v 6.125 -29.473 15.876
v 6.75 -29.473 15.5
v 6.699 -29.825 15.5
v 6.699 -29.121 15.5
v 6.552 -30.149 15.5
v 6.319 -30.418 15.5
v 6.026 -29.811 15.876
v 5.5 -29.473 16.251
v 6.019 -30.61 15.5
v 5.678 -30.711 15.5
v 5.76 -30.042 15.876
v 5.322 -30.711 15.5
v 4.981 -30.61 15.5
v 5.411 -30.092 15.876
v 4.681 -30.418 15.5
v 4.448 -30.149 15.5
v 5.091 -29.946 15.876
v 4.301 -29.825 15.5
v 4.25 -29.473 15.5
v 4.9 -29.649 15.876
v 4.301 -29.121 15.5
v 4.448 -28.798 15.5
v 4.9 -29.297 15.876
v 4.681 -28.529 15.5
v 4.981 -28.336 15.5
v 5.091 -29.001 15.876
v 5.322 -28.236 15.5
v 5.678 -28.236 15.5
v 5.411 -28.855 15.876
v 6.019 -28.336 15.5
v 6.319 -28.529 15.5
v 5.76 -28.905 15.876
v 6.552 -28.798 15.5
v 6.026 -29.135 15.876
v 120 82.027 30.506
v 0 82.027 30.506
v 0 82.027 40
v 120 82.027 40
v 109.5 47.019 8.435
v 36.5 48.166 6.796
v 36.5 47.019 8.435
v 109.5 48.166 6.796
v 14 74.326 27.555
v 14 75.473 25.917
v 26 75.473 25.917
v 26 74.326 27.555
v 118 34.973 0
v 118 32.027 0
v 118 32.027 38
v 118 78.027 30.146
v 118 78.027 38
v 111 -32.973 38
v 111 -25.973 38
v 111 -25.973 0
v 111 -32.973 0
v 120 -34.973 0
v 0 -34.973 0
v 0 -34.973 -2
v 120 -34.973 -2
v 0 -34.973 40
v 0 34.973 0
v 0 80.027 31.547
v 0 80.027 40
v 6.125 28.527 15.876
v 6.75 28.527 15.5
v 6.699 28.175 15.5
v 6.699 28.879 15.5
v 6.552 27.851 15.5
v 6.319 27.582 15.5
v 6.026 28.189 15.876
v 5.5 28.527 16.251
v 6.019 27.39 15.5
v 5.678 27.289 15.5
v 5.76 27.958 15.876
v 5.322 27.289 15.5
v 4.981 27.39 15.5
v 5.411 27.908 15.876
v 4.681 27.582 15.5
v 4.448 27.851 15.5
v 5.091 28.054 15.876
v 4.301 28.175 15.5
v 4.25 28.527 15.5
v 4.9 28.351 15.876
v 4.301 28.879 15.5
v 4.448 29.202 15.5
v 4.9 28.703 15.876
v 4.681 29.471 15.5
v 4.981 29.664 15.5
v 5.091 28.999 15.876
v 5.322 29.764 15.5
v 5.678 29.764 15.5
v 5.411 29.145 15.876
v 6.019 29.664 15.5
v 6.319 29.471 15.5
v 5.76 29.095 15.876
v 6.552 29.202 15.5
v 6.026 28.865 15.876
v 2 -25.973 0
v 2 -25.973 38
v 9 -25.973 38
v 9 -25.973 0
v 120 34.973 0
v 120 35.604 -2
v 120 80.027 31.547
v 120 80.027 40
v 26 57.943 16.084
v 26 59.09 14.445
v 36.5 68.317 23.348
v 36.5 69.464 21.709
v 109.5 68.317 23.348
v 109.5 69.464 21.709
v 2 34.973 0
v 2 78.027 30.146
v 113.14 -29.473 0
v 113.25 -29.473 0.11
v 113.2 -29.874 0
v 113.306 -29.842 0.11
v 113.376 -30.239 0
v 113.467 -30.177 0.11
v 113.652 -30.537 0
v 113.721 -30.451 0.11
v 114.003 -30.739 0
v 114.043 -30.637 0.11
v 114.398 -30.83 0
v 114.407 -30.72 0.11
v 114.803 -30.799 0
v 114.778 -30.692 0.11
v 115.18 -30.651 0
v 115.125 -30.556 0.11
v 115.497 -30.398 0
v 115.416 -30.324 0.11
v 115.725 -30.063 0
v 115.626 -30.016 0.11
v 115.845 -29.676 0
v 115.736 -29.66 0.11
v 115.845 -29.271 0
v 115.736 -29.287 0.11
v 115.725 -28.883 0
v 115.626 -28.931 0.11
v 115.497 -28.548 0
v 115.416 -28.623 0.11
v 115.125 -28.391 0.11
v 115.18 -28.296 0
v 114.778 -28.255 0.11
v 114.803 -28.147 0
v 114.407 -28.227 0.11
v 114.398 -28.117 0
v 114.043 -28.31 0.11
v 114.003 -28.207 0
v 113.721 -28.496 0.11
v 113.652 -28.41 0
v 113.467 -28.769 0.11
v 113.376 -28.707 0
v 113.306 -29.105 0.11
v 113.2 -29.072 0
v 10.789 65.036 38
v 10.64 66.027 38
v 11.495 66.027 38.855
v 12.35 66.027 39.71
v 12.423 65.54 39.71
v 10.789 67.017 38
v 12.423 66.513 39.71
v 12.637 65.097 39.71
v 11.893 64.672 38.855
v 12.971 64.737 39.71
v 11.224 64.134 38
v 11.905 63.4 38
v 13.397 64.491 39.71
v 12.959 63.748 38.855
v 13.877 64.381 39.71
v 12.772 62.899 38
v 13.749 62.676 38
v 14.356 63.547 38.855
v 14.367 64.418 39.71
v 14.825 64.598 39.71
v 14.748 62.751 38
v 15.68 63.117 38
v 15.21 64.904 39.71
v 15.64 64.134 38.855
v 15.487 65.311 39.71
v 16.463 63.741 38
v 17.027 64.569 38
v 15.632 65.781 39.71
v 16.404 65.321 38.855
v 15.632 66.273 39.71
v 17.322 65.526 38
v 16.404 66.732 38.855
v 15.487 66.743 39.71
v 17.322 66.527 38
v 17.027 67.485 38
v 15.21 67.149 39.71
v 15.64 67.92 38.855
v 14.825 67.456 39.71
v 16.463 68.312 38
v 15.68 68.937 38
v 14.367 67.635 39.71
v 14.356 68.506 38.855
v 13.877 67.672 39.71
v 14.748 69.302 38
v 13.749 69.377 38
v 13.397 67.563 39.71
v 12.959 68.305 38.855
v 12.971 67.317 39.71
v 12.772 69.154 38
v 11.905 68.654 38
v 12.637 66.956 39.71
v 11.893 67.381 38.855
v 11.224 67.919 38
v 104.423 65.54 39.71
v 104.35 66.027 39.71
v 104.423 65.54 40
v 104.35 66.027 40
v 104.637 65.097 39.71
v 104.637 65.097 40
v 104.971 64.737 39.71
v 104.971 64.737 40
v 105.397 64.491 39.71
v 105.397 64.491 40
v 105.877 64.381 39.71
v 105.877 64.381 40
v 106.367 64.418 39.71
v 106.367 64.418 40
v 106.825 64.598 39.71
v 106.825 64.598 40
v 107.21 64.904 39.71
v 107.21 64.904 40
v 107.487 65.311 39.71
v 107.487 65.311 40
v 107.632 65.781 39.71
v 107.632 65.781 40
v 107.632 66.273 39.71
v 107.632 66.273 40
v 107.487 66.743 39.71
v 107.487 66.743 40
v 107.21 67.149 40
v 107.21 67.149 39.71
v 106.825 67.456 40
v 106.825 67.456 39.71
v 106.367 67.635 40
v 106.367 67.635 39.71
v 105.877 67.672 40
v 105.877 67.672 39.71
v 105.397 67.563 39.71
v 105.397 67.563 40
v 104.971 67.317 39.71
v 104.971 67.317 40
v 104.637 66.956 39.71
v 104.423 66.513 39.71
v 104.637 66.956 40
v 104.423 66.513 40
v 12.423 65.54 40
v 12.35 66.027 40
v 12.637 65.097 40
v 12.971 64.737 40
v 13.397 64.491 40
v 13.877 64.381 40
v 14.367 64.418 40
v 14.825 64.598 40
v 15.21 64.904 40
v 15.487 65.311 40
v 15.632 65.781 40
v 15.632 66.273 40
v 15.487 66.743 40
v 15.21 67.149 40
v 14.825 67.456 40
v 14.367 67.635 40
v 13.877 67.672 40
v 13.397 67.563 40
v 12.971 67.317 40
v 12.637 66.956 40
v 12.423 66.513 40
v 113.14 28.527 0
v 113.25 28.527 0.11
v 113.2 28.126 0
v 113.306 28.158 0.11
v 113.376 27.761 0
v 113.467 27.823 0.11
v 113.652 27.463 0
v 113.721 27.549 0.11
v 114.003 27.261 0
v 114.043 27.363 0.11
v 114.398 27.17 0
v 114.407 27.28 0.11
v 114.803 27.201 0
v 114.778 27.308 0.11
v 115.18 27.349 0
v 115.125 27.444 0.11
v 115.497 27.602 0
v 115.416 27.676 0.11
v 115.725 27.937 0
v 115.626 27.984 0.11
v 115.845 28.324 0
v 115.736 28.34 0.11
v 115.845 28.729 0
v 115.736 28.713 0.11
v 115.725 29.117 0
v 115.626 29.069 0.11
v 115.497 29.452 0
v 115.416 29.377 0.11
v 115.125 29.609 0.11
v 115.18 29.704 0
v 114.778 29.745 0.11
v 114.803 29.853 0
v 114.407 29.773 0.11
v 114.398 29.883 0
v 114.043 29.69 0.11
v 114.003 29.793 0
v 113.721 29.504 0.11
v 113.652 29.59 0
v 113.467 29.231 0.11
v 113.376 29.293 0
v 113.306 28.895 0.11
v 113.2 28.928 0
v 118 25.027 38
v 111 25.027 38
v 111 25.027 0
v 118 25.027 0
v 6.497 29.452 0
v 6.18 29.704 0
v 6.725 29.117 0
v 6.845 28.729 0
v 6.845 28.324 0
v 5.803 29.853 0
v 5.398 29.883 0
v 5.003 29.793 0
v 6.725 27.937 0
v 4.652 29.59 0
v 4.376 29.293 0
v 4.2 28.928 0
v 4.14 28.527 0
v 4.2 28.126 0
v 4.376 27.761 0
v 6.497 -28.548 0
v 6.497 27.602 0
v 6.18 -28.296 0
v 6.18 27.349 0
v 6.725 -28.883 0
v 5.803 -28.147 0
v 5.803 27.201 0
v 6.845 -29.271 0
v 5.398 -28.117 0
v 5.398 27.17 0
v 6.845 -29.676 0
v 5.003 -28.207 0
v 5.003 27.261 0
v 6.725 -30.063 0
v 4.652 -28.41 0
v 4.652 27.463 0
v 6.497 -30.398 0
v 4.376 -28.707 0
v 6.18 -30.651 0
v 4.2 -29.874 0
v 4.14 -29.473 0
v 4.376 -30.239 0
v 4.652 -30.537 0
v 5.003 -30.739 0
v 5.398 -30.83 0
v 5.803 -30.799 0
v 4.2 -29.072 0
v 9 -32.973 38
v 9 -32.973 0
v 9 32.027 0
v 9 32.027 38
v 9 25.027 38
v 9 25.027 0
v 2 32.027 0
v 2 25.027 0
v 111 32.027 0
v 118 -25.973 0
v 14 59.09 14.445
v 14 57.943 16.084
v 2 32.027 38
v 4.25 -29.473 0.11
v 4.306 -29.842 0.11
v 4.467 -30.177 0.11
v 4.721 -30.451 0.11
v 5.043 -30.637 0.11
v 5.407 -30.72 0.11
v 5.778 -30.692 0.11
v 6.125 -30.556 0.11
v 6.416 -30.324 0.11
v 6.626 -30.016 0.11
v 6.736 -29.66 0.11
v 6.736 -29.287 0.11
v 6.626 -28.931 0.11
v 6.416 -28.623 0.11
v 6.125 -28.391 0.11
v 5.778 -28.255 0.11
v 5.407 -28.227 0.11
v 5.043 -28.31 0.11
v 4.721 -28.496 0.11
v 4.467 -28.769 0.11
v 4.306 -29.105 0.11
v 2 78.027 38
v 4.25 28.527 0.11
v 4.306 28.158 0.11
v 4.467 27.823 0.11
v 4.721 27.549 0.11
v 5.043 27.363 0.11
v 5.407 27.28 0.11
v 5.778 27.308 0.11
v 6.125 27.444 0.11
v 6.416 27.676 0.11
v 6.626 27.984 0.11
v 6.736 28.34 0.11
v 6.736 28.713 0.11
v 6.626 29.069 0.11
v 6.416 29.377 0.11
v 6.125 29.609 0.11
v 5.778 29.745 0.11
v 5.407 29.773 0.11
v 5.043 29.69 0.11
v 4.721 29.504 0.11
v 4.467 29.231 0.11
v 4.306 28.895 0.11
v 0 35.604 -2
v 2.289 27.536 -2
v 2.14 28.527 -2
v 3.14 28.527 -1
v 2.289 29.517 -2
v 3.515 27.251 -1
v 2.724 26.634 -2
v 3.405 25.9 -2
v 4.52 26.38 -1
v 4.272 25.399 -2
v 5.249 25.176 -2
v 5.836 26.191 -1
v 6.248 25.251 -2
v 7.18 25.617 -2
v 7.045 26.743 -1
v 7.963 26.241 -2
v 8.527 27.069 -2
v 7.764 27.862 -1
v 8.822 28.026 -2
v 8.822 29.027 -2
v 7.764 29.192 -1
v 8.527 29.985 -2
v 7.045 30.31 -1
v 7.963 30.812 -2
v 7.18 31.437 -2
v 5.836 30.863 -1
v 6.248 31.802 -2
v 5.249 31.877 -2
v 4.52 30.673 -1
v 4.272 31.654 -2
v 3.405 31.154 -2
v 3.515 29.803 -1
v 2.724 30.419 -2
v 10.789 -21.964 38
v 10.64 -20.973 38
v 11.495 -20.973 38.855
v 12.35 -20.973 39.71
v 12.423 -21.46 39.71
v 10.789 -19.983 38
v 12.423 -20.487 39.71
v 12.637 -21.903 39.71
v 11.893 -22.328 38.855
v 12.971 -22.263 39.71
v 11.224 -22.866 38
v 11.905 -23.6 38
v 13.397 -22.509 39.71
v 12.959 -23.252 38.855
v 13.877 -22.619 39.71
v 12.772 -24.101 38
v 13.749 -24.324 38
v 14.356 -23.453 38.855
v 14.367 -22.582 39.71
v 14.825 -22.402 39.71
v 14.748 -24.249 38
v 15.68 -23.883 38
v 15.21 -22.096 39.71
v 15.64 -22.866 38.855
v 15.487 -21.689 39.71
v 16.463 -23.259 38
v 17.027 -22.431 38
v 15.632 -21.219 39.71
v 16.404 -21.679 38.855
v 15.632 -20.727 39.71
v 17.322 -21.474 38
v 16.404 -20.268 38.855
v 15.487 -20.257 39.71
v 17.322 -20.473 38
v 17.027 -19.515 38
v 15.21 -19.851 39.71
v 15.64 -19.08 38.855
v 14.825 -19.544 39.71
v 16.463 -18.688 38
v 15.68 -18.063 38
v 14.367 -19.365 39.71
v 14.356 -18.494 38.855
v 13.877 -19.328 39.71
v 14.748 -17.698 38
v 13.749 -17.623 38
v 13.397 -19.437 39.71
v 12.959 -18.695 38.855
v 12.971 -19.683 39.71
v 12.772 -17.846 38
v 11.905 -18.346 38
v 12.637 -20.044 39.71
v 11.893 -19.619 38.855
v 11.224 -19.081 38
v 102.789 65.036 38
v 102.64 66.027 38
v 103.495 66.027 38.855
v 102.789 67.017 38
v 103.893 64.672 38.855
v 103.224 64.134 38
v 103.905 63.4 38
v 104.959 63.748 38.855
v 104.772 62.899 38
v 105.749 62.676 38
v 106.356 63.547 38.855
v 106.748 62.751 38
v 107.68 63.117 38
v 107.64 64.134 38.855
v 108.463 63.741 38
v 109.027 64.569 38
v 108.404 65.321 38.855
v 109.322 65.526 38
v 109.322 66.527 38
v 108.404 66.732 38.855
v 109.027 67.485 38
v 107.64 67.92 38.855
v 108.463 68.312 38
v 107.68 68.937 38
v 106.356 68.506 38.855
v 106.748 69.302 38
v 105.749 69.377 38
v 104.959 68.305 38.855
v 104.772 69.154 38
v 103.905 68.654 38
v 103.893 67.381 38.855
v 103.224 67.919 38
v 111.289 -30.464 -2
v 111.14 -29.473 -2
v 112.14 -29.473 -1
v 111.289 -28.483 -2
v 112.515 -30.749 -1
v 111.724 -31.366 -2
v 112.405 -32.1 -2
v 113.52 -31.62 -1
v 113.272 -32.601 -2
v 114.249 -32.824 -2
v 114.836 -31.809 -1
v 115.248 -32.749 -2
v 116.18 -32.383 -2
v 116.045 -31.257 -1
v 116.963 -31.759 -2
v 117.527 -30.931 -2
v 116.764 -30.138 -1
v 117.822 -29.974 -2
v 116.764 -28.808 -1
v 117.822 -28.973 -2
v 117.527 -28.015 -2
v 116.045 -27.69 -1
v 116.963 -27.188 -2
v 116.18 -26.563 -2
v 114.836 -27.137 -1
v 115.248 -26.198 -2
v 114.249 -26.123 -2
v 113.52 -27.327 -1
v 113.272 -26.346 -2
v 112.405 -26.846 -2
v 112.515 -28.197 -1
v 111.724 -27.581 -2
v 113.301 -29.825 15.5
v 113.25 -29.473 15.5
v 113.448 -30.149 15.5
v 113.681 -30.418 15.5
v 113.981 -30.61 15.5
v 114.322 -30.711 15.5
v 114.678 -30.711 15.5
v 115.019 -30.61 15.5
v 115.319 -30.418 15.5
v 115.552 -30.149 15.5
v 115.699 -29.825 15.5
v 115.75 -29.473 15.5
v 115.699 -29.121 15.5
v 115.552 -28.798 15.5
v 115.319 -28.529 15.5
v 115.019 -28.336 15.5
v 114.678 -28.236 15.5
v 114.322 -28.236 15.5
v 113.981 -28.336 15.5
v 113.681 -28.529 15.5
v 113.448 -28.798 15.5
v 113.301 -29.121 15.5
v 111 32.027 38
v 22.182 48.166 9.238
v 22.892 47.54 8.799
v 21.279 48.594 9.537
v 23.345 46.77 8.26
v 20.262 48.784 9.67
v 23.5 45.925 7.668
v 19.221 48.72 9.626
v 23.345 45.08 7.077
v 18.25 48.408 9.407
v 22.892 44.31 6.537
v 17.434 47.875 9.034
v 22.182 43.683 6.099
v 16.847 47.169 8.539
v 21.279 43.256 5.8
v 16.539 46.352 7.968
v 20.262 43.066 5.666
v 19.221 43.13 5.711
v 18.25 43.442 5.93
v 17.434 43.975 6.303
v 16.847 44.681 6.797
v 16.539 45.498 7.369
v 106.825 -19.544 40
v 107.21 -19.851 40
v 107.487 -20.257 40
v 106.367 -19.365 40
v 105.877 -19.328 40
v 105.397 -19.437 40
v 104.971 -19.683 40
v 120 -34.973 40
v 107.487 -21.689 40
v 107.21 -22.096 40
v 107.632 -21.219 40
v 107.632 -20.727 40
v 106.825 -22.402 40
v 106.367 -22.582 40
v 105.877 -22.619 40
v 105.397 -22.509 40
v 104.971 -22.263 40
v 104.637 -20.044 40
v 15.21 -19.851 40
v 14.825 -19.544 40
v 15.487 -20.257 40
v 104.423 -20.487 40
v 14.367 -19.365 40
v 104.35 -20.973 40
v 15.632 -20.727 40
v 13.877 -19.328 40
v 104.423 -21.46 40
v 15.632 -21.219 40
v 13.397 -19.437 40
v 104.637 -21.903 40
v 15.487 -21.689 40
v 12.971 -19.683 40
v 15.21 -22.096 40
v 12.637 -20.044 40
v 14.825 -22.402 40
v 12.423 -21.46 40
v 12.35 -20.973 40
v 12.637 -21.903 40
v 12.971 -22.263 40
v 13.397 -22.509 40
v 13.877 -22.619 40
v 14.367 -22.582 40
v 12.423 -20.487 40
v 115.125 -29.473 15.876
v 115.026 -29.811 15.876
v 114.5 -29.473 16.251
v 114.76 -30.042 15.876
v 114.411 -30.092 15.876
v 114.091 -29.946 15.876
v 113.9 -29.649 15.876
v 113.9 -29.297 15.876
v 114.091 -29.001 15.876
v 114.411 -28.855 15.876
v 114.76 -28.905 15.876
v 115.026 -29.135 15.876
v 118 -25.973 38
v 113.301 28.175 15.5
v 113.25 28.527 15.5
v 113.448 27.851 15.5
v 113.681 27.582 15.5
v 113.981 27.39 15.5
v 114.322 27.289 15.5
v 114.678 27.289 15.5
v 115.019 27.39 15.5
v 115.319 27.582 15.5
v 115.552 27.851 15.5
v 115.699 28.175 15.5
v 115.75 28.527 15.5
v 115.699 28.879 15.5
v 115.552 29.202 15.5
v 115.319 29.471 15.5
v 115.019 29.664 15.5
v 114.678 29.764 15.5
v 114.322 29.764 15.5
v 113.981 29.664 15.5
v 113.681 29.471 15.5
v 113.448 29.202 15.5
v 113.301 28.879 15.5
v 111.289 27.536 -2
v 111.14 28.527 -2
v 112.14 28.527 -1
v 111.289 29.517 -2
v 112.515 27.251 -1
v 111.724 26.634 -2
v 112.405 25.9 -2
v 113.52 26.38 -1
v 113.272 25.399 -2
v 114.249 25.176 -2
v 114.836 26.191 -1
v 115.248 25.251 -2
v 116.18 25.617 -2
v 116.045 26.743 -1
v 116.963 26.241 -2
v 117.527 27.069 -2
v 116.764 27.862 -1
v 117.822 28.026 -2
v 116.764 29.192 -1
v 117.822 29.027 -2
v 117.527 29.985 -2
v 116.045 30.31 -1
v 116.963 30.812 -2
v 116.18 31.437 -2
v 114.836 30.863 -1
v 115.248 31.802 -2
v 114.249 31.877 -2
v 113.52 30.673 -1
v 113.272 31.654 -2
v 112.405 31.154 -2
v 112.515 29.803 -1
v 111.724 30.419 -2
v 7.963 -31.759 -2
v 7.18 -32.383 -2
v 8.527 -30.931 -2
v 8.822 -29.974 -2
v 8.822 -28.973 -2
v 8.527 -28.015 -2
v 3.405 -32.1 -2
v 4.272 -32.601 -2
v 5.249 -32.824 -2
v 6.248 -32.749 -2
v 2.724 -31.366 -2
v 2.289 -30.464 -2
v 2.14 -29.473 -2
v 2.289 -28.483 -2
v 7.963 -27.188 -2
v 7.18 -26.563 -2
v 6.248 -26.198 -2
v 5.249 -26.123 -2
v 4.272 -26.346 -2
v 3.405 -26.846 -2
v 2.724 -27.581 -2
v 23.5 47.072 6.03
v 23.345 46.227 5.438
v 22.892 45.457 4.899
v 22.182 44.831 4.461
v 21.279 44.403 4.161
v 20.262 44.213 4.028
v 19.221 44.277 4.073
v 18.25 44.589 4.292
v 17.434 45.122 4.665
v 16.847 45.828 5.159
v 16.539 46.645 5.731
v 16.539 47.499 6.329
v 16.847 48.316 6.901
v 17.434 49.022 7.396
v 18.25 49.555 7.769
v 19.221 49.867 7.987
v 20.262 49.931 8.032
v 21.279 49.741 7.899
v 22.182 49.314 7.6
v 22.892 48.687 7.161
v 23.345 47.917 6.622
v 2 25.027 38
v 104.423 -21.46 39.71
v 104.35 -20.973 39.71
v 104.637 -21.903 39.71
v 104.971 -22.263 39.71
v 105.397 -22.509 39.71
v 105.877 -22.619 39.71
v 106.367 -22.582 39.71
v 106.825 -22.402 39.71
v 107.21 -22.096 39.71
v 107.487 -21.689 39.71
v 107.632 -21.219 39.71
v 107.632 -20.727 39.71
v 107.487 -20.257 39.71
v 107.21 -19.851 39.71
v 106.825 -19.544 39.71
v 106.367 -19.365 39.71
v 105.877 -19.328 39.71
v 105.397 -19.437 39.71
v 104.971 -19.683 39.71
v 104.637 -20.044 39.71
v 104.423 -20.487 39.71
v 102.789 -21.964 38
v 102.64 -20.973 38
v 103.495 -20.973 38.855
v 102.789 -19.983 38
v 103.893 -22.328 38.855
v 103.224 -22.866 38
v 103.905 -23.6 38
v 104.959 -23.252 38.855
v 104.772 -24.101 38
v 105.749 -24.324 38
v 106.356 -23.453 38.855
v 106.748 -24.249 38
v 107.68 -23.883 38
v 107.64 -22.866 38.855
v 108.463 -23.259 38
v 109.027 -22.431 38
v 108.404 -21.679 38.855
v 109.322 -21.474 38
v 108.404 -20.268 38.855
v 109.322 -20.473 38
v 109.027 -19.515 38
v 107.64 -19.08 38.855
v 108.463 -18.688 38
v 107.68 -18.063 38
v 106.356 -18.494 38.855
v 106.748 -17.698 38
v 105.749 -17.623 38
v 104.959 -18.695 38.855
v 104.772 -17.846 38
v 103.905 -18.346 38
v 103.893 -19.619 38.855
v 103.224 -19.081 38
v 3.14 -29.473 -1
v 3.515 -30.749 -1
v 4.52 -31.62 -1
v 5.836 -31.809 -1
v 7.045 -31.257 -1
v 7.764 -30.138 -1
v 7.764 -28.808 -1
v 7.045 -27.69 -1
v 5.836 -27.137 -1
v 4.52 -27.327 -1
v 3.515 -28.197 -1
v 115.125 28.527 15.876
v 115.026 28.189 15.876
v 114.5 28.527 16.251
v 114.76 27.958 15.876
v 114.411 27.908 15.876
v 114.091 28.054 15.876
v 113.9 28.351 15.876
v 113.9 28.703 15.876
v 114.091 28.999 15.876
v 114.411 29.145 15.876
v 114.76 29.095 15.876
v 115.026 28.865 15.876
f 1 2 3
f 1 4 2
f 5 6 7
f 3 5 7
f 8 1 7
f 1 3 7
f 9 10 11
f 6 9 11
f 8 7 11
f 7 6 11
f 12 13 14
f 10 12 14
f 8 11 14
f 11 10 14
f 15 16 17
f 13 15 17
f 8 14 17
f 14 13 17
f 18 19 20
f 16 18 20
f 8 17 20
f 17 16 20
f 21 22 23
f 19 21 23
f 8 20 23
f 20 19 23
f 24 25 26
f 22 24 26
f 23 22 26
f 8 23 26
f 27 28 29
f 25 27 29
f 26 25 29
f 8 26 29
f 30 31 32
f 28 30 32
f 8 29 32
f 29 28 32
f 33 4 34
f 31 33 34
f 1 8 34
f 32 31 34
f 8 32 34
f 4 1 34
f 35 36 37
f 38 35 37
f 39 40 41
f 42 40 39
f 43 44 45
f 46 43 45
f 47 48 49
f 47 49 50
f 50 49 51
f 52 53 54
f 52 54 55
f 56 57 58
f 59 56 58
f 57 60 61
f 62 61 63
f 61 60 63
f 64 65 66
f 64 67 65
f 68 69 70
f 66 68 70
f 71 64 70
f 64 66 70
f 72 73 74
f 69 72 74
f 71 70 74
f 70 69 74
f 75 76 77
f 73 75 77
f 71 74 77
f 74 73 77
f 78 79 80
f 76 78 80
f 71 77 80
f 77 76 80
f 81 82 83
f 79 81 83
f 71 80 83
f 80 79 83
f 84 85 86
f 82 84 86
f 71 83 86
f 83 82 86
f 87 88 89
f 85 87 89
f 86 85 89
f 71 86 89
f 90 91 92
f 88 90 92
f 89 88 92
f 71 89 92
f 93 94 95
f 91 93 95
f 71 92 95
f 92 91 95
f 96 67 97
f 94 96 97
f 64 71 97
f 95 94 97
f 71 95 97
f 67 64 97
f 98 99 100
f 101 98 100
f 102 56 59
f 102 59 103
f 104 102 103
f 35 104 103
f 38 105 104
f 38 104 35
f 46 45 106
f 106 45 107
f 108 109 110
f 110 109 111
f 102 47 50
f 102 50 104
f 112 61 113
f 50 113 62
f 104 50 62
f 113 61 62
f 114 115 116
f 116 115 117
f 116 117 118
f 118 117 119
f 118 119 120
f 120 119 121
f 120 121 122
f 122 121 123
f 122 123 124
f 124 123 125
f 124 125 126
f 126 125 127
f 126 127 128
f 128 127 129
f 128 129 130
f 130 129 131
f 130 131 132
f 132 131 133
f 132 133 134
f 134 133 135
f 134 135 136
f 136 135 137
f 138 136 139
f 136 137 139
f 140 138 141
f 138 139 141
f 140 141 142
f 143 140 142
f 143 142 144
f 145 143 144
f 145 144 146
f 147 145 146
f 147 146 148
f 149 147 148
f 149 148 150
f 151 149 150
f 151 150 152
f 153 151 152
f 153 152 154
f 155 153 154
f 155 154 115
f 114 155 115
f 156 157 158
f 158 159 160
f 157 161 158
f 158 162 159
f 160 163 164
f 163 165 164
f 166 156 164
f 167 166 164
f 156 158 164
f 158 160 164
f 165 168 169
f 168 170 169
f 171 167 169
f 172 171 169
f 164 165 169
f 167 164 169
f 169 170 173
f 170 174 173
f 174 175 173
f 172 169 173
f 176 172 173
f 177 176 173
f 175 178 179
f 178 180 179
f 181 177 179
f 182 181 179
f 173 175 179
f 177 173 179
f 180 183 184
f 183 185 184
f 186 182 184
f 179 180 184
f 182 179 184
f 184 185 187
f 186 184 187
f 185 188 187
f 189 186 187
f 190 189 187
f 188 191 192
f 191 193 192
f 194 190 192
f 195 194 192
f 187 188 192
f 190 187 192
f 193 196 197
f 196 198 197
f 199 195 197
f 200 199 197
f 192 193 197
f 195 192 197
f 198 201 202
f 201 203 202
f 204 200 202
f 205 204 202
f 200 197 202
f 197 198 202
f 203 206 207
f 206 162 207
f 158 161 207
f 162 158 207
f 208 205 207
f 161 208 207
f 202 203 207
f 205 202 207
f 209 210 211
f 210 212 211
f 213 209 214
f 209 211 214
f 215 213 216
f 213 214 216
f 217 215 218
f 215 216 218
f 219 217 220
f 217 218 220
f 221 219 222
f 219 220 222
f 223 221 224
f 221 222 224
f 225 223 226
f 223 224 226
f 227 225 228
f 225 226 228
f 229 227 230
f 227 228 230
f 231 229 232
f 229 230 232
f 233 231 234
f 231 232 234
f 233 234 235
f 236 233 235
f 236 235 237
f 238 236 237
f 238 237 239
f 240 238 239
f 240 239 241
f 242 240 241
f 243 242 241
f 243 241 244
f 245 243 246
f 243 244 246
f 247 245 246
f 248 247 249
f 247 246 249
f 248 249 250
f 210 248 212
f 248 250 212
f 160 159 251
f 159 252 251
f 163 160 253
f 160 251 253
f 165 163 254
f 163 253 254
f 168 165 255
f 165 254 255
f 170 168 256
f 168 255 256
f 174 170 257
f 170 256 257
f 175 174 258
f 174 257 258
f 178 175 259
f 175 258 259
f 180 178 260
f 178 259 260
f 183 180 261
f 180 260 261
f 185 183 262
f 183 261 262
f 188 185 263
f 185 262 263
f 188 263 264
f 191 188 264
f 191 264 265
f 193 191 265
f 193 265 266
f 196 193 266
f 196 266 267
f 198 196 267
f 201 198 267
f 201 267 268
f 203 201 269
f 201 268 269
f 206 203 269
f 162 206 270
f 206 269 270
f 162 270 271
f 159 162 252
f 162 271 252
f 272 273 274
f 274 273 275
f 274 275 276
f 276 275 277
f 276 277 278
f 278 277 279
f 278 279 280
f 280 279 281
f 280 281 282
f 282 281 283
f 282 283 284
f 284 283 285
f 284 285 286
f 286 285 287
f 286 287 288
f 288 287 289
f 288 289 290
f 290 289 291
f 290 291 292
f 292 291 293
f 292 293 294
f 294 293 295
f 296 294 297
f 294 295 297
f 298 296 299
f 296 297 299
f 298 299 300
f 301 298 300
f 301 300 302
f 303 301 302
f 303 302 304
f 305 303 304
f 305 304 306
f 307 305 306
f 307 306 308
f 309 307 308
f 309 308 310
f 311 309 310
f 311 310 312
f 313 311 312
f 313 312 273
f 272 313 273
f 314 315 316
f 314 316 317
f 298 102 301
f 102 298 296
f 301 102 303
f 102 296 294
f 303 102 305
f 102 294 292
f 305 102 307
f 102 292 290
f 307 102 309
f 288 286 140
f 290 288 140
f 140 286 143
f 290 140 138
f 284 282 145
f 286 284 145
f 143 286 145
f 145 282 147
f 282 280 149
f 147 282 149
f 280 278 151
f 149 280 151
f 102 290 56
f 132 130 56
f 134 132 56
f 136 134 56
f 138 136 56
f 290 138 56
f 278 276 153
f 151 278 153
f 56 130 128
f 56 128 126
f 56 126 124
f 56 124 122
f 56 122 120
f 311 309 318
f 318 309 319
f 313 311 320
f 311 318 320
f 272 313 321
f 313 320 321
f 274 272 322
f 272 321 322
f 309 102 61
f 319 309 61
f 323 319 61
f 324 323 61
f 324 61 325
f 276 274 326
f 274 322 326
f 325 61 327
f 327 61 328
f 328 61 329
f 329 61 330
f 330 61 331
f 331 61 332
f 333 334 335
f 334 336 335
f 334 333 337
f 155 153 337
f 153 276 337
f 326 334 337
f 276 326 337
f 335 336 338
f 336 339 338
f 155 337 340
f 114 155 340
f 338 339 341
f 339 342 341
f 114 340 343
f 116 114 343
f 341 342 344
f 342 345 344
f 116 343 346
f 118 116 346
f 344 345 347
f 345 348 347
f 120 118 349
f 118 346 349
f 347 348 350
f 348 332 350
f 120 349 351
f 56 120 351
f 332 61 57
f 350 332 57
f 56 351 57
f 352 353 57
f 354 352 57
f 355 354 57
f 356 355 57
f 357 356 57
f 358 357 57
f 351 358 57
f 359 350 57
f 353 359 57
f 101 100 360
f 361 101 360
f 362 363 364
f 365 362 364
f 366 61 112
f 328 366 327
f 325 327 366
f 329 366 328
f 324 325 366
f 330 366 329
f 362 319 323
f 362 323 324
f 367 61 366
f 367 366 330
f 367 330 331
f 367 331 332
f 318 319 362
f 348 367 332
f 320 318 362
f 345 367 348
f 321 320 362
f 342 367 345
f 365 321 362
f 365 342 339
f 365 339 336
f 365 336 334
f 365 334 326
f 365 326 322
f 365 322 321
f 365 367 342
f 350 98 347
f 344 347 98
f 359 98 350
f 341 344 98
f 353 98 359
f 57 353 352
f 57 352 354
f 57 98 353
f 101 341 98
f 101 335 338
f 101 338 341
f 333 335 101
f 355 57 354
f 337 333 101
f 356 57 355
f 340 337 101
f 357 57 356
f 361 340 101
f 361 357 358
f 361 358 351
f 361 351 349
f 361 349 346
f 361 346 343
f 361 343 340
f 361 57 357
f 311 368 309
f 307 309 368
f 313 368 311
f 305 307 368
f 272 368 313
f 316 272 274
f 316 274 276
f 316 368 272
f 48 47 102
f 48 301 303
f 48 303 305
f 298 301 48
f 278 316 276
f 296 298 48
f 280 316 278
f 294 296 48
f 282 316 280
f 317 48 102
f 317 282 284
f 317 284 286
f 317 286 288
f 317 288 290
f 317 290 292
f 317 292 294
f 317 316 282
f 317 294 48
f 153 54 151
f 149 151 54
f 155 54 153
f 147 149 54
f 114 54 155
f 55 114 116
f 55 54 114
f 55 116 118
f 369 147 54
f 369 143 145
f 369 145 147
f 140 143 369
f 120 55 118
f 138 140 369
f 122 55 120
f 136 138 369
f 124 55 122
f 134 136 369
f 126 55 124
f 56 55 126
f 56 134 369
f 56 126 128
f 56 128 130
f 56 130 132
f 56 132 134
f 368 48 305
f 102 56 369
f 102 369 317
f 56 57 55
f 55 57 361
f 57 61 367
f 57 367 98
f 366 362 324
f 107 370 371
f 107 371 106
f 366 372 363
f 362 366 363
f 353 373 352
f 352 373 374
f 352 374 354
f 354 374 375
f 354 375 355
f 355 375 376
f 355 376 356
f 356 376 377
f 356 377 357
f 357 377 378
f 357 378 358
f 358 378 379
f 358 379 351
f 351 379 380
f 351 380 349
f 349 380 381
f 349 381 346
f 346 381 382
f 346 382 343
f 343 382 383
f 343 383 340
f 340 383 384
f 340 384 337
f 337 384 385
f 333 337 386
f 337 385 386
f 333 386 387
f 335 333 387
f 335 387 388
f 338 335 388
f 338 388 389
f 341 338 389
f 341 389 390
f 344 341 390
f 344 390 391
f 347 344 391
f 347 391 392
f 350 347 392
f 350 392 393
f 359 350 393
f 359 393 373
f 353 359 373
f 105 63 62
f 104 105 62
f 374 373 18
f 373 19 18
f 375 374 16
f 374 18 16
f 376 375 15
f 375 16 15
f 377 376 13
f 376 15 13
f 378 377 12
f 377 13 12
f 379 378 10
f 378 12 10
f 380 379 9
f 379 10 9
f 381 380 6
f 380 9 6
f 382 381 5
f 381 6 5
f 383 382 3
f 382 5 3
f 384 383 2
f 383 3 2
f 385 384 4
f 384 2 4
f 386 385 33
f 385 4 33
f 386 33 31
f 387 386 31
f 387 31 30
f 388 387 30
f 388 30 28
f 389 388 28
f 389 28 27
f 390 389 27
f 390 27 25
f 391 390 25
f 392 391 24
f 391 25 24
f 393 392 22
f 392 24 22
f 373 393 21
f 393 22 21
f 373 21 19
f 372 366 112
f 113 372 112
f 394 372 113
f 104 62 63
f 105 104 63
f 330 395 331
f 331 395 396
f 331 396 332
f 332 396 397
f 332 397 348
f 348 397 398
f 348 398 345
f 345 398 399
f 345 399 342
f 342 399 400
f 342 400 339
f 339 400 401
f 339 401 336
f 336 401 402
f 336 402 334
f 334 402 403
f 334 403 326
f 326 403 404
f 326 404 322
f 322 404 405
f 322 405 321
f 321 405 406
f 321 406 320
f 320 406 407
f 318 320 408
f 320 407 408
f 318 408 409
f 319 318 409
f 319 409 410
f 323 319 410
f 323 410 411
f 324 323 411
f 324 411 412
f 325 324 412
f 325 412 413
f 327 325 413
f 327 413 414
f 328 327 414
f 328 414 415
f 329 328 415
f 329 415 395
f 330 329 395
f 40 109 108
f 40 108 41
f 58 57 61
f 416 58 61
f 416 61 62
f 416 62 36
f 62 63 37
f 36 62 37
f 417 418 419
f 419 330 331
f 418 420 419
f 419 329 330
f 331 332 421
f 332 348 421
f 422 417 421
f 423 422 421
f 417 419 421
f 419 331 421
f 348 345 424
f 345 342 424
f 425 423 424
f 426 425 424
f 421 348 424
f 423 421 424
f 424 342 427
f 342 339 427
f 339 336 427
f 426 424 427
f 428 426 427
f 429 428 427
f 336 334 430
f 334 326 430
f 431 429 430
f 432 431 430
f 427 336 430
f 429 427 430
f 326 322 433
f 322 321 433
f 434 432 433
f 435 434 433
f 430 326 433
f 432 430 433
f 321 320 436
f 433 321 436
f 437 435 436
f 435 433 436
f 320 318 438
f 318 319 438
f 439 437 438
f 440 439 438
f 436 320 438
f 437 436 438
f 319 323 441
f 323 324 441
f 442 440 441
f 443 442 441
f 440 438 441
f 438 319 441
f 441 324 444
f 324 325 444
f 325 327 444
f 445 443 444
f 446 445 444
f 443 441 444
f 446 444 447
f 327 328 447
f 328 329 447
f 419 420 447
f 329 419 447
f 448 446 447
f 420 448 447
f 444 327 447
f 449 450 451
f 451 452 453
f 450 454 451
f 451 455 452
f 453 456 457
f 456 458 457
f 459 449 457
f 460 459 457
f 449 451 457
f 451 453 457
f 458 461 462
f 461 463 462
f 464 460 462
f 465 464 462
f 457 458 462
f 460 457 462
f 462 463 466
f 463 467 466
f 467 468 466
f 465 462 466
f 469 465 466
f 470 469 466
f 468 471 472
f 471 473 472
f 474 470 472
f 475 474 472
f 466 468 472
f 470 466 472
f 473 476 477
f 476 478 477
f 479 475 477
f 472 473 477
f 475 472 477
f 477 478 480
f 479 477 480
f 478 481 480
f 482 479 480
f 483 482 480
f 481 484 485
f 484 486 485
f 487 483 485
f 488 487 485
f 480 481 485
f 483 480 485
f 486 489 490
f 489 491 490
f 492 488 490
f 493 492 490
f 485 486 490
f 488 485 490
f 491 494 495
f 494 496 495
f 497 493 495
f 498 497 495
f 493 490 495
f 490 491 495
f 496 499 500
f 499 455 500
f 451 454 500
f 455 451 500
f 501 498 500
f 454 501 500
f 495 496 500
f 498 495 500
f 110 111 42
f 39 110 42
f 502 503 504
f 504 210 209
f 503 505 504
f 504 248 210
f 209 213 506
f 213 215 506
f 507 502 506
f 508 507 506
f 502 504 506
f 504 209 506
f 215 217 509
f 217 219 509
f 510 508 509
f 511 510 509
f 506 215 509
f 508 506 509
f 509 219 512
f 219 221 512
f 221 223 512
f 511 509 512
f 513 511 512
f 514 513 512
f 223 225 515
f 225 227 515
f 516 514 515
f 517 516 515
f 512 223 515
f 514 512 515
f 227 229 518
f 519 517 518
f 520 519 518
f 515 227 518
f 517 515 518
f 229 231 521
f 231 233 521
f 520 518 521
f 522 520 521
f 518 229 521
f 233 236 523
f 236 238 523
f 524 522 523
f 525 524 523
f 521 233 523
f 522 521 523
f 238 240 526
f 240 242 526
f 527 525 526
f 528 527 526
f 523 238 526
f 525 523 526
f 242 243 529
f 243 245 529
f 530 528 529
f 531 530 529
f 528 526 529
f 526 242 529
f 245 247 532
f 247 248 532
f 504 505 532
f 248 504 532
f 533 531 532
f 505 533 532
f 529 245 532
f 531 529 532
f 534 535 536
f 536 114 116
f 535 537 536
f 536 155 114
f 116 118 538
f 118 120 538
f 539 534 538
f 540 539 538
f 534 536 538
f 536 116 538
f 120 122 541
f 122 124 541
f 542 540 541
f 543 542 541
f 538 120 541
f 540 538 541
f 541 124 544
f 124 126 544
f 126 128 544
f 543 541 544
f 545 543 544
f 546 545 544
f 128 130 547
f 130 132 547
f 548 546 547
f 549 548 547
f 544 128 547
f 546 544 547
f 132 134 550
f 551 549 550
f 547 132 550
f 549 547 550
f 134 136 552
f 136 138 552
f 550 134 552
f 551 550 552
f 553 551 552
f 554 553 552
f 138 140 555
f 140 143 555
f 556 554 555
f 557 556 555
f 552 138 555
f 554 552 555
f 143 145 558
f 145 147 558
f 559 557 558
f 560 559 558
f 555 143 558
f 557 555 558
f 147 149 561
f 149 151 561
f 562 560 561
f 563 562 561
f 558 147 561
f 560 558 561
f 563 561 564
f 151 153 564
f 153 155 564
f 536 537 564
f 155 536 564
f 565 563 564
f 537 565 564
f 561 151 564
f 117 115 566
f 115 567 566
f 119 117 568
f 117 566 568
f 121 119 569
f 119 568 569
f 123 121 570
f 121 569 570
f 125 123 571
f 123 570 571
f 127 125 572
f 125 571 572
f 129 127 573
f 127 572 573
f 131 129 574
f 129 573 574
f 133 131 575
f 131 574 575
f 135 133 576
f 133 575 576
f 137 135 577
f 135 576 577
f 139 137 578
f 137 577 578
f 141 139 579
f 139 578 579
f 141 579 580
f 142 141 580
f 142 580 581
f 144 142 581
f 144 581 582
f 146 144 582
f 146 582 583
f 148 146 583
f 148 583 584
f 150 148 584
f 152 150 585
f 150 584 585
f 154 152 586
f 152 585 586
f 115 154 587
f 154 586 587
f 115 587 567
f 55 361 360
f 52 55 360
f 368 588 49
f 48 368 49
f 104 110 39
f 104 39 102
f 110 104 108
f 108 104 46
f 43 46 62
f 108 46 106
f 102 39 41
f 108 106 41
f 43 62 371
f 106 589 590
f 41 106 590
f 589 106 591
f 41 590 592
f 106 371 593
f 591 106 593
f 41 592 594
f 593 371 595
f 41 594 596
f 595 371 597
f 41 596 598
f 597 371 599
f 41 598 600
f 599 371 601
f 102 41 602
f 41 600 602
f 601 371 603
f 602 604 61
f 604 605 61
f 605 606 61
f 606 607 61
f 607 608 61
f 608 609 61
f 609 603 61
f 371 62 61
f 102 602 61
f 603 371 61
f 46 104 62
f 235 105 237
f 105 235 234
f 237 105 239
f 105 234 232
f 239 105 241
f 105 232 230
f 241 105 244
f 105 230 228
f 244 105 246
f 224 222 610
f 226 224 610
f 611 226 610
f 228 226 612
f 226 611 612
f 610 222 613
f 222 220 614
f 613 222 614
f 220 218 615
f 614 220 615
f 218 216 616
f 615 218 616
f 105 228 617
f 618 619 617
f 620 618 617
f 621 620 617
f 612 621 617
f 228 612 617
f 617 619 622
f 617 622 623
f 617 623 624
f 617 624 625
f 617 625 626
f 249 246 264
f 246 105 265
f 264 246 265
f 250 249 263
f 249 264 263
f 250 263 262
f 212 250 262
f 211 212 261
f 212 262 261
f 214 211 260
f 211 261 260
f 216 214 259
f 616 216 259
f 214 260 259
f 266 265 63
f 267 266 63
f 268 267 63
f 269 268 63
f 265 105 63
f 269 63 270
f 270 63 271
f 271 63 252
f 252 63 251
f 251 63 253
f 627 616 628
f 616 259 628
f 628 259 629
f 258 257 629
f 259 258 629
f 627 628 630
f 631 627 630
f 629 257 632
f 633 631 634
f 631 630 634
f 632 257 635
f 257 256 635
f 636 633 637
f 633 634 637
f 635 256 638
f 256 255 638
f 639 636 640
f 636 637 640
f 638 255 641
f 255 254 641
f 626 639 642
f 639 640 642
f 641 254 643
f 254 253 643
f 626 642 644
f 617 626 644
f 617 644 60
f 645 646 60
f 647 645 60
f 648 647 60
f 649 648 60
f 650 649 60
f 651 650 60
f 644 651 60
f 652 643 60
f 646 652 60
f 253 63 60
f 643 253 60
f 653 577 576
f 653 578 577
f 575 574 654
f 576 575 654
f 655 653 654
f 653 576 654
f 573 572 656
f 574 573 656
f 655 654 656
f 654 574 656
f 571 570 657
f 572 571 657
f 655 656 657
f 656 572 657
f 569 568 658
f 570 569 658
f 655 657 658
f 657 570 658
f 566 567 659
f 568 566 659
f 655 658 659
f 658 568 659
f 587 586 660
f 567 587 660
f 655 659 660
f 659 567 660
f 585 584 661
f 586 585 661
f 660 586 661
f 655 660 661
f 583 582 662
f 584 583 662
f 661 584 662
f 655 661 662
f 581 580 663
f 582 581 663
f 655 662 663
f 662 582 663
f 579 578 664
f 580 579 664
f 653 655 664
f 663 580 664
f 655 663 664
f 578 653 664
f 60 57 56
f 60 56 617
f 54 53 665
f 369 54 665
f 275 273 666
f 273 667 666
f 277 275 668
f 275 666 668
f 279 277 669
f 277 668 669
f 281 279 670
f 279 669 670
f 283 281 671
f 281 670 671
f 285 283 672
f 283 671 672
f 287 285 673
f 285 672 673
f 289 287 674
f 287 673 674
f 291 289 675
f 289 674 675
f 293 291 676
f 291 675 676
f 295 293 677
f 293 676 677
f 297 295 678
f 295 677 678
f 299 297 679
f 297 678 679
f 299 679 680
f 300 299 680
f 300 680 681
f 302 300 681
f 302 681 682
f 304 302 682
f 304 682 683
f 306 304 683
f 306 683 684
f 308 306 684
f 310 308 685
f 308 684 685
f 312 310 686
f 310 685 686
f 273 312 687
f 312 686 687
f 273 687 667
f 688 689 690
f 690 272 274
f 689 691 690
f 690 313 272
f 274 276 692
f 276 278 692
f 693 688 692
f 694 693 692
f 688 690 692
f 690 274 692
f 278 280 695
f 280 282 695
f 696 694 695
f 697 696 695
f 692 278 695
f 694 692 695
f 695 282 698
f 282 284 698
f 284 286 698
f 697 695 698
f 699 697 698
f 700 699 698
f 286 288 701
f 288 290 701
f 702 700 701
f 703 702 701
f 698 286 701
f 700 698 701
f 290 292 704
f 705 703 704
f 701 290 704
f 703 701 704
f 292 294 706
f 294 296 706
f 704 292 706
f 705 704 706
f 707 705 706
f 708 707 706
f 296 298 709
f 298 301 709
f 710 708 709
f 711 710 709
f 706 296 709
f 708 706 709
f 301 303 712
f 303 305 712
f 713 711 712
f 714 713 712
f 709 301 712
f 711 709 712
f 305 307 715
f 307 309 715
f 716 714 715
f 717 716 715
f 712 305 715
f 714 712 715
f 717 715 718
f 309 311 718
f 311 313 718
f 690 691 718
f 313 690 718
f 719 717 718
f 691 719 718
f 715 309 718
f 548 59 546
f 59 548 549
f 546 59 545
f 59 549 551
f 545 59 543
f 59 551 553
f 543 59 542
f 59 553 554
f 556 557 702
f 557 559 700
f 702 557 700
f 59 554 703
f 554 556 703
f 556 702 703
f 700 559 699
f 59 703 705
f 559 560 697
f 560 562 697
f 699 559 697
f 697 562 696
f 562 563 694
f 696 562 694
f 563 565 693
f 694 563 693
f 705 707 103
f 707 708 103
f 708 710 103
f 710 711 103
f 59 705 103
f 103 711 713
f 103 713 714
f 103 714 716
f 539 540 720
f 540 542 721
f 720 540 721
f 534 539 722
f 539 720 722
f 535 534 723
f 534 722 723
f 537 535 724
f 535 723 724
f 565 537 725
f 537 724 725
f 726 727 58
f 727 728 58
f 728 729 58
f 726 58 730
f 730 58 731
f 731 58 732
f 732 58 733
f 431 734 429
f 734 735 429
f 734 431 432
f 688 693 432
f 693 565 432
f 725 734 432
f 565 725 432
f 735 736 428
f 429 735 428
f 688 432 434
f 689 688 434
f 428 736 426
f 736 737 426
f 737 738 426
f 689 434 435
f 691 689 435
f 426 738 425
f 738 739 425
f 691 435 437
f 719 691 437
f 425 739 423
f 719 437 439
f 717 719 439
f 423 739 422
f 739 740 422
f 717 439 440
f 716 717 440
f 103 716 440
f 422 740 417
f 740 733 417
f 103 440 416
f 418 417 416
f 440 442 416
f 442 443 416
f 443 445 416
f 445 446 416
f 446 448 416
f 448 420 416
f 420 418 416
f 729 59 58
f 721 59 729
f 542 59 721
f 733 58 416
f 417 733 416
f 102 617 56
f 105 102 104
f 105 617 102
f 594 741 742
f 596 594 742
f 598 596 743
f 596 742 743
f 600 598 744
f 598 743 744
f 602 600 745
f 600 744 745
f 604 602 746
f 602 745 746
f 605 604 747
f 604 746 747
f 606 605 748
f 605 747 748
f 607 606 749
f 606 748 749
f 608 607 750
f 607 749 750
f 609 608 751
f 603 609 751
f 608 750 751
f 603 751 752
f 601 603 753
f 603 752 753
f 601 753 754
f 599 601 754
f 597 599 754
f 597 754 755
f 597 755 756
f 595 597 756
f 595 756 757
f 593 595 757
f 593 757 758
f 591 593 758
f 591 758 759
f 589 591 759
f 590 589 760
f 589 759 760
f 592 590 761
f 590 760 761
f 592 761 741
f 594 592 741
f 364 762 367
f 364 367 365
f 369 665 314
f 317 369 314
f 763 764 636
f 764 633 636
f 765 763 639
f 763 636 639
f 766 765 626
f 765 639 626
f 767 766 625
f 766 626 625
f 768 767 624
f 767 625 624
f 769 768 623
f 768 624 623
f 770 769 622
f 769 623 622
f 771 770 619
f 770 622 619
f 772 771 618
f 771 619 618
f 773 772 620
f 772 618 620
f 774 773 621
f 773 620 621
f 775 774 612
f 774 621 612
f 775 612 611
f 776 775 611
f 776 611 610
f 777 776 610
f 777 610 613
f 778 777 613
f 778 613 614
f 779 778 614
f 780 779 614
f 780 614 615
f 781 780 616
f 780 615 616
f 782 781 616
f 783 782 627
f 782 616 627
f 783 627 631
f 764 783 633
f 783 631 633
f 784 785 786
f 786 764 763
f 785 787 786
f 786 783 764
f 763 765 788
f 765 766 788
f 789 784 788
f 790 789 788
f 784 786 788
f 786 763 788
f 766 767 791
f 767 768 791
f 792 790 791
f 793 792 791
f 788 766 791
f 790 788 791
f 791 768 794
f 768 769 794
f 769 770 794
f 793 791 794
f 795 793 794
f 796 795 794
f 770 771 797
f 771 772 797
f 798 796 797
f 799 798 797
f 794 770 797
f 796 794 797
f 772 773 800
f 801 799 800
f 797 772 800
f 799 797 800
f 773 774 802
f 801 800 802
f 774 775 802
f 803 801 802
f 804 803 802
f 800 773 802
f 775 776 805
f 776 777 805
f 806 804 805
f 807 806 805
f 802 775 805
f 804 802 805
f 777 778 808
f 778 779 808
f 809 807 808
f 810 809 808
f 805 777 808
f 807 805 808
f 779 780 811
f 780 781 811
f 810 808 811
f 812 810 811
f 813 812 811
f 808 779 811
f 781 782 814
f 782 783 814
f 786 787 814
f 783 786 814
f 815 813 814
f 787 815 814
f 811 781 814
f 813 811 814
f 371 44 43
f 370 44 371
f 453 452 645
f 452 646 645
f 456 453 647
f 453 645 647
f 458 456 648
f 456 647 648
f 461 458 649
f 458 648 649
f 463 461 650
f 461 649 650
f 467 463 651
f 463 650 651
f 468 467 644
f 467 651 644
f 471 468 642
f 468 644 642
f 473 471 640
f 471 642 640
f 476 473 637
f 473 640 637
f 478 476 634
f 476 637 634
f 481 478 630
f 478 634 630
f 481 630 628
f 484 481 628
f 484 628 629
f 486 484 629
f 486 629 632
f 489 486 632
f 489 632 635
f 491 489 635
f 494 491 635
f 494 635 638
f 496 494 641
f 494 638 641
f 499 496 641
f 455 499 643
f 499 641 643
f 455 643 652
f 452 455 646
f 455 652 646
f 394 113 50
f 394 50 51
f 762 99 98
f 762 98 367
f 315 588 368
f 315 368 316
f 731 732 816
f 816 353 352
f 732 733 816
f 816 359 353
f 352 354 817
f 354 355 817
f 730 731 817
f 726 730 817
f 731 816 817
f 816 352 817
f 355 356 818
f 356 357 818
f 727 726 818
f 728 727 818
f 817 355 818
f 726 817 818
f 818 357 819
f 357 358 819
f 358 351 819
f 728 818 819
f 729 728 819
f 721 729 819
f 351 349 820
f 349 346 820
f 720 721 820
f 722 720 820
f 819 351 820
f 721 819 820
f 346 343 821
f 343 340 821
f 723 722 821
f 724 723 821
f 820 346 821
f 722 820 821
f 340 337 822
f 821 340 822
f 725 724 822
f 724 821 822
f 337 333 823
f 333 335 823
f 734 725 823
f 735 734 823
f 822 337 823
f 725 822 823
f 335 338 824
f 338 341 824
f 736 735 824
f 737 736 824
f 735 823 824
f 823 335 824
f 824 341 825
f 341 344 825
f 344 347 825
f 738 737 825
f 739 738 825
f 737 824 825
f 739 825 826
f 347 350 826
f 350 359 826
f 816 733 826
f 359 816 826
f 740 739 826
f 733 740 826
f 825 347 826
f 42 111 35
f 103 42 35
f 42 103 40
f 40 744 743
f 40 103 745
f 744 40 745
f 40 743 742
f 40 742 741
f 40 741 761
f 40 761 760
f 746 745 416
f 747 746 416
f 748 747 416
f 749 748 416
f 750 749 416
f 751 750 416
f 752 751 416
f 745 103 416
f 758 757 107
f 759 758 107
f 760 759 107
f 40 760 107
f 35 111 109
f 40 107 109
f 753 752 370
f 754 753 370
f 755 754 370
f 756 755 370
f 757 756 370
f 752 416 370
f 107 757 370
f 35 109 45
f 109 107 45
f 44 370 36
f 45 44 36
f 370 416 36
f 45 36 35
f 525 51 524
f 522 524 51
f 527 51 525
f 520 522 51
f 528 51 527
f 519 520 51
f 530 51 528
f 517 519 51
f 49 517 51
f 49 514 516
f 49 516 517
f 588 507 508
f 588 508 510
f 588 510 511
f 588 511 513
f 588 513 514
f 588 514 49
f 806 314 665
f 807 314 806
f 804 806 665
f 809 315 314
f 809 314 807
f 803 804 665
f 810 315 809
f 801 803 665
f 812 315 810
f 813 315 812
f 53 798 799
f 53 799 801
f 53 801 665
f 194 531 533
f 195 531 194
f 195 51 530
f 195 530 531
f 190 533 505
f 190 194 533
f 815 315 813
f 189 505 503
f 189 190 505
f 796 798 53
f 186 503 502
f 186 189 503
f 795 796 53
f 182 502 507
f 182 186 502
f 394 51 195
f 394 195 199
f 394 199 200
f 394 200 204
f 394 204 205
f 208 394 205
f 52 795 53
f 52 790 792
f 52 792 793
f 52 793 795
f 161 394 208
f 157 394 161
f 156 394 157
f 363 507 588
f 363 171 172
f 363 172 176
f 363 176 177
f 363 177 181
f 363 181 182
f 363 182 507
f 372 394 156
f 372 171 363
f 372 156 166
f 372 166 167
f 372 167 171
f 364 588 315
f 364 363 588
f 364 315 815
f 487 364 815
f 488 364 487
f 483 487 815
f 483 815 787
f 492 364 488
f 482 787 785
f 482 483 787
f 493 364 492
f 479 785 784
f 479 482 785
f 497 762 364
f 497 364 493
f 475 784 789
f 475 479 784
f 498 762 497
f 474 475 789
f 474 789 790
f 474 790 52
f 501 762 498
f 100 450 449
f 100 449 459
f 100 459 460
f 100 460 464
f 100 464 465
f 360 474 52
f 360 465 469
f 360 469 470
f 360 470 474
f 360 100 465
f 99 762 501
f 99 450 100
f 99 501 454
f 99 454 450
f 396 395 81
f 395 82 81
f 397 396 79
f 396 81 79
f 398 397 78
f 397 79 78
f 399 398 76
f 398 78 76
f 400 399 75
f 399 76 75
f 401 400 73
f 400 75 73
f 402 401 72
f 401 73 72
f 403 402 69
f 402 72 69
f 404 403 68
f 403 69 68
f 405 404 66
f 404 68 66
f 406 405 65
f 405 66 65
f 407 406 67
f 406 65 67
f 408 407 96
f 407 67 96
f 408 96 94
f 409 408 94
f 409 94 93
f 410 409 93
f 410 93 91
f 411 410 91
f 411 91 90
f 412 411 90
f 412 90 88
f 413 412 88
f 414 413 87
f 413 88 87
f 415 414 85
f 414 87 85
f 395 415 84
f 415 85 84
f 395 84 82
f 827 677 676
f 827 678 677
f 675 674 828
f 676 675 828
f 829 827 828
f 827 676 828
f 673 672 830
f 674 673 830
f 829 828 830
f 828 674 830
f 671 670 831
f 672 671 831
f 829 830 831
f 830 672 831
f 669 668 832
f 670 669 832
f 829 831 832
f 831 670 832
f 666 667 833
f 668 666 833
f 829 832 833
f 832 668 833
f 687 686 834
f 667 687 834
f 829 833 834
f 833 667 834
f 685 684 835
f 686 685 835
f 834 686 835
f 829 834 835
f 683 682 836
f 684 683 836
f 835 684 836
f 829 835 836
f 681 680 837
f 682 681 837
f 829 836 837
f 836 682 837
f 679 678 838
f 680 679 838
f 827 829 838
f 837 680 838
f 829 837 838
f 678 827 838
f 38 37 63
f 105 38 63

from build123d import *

# Parameters (mm, degrees)
F0_W             = 69.9466375641
F0_H             = 40
F1_DEPTH         = 120
F2_T             = -2
F3_W             = 7
F3_H             = 7
F4_DEPTH         = 38
F5_DEPTH         = 120
F6_W             = 73
F6_H             = 26
F6_R             = 3.5
F6_W_2           = 12
F6_H_2           = 20
F7_DEPTH         = 2
F9_D             = 2.5
F9_DEPTH         = 17.5
F9_CSINK_D       = 6.72
F9_CSINK_ANGLE   = 90
F9_TIP           = 0.7510757738
F9_2_D           = 2.5
F9_2_DEPTH       = 17.5
F9_2_CSINK_D     = 6.72
F9_2_CSINK_ANGLE = 90
F9_2_TIP         = 0.7510757738
F10_D            = 3.3
F10_DEPTH        = 25
F10_CSINK_D      = 6.72
F10_CSINK_ANGLE  = 90
F10_TIP          = 0.9914200214


with BuildPart() as f1:
    # F0 (on Right) → F1 (new body)
    with BuildSketch(Plane.YZ):
        with Locations((0, 20)):
            Rectangle(F0_W, F0_H)
        Polygon((34.9733187821, 40), (34.9733187821, 0), (80.0266812179, 31.5467039993), (80.0266812179, 40), align=None)
    extrude(amount=F1_DEPTH)

    # F2
    f2_openings = [f1.faces().sort_by_distance(p)[0] for p in [
        (60, 0, 0),
        (60, 57.5, 15.773352),
    ]]
    offset(amount=F2_T, openings=f2_openings)

    # F3 (on face) → F4 (join, through all)
    with BuildSketch(Plane(origin=(0, 0, 38), x_dir=(1, 0, 0), z_dir=(0, 0, -1))):
        with Locations((5.5, 29.4733187821)):
            Rectangle(F3_W, F3_H)
        with Locations((114.5, 29.4733187821)):
            Rectangle(F3_W, F3_H)
        with Locations((5.5, -28.5266812179)):
            Rectangle(F3_W, F3_H)
        with Locations((114.5, -28.5266812179)):
            Rectangle(F3_W, F3_H)
    extrude(amount=F4_DEPTH)

    # F9
    with Locations(Plane(origin=(0, 0, -2), x_dir=(1, 0, 0), z_dir=(0, 0, -1))):
        with Locations((114.5, -28.5266812179), (114.5, 29.4733187821), (5.5, 29.4733187821), (5.5, -28.5266812179)):
            CounterSinkHole(F9_D / 2, F9_CSINK_D / 2, depth=F9_DEPTH, counter_sink_angle=F9_CSINK_ANGLE)
            with Locations((0, 0, -(F9_DEPTH + F9_TIP / 2))):  # 118° drill point
                Cone(0, F9_D / 2, F9_TIP, mode=Mode.SUBTRACT)

    # F10
    with Locations(Plane(origin=(0, 0, 38), x_dir=(1, 0, 0), z_dir=(0, 0, -1))):
        with Locations((14, 20.9733187821), (106, 20.9733187821), (106, -66.0266812179), (14, -66.0266812179)):
            CounterSinkHole(F10_D / 2, F10_CSINK_D / 2, depth=F10_DEPTH, counter_sink_angle=F10_CSINK_ANGLE)
            with Locations((0, 0, -(F10_DEPTH + F10_TIP / 2))):  # 118° drill point
                Cone(0, F10_D / 2, F10_TIP, mode=Mode.SUBTRACT)


with BuildPart() as f5:
    # F0 (on Right) → F5 (new body, through all)
    with BuildSketch(Plane.YZ):
        Polygon((80.0266812179, 31.5467039993), (34.9733187821, 0), (-34.9733187821, 0), (-34.9733187821, -2), (35.6039163598, -2), (82.0266812179, 30.5055698982), (82.0266812179, 40), (80.0266812179, 40), align=None)
    extrude(amount=F5_DEPTH)

    # F6 (on face) → F7 (cut, through all)
    with BuildSketch(Plane(origin=(0, 12.6530225125, -18.0703888805), x_dir=(1, 0, 0), z_dir=(0, 0.5735764364, -0.8191520443))):
        with Locations((73, -56.3537338376)):
            Rectangle(F6_W, F6_H)
        with Locations((20, -42.0178679981)):
            Circle(F6_R)
        with Locations((20, -66.689599677)):
            Rectangle(F6_W_2, F6_H_2)
    extrude(amount=-F7_DEPTH, mode=Mode.SUBTRACT)

    # F9#2
    with Locations(Plane(origin=(0, 0, -2), x_dir=(1, 0, 0), z_dir=(0, 0, -1))):
        with Locations((114.5, -28.5266812179), (114.5, 29.4733187821), (5.5, 29.4733187821), (5.5, -28.5266812179)):
            CounterSinkHole(F9_2_D / 2, F9_2_CSINK_D / 2, depth=F9_2_DEPTH, counter_sink_angle=F9_2_CSINK_ANGLE)
            with Locations((0, 0, -(F9_2_DEPTH + F9_2_TIP / 2))):  # 118° drill point
                Cone(0, F9_2_D / 2, F9_2_TIP, mode=Mode.SUBTRACT)


solid = Compound([f1.part, f5.part])
